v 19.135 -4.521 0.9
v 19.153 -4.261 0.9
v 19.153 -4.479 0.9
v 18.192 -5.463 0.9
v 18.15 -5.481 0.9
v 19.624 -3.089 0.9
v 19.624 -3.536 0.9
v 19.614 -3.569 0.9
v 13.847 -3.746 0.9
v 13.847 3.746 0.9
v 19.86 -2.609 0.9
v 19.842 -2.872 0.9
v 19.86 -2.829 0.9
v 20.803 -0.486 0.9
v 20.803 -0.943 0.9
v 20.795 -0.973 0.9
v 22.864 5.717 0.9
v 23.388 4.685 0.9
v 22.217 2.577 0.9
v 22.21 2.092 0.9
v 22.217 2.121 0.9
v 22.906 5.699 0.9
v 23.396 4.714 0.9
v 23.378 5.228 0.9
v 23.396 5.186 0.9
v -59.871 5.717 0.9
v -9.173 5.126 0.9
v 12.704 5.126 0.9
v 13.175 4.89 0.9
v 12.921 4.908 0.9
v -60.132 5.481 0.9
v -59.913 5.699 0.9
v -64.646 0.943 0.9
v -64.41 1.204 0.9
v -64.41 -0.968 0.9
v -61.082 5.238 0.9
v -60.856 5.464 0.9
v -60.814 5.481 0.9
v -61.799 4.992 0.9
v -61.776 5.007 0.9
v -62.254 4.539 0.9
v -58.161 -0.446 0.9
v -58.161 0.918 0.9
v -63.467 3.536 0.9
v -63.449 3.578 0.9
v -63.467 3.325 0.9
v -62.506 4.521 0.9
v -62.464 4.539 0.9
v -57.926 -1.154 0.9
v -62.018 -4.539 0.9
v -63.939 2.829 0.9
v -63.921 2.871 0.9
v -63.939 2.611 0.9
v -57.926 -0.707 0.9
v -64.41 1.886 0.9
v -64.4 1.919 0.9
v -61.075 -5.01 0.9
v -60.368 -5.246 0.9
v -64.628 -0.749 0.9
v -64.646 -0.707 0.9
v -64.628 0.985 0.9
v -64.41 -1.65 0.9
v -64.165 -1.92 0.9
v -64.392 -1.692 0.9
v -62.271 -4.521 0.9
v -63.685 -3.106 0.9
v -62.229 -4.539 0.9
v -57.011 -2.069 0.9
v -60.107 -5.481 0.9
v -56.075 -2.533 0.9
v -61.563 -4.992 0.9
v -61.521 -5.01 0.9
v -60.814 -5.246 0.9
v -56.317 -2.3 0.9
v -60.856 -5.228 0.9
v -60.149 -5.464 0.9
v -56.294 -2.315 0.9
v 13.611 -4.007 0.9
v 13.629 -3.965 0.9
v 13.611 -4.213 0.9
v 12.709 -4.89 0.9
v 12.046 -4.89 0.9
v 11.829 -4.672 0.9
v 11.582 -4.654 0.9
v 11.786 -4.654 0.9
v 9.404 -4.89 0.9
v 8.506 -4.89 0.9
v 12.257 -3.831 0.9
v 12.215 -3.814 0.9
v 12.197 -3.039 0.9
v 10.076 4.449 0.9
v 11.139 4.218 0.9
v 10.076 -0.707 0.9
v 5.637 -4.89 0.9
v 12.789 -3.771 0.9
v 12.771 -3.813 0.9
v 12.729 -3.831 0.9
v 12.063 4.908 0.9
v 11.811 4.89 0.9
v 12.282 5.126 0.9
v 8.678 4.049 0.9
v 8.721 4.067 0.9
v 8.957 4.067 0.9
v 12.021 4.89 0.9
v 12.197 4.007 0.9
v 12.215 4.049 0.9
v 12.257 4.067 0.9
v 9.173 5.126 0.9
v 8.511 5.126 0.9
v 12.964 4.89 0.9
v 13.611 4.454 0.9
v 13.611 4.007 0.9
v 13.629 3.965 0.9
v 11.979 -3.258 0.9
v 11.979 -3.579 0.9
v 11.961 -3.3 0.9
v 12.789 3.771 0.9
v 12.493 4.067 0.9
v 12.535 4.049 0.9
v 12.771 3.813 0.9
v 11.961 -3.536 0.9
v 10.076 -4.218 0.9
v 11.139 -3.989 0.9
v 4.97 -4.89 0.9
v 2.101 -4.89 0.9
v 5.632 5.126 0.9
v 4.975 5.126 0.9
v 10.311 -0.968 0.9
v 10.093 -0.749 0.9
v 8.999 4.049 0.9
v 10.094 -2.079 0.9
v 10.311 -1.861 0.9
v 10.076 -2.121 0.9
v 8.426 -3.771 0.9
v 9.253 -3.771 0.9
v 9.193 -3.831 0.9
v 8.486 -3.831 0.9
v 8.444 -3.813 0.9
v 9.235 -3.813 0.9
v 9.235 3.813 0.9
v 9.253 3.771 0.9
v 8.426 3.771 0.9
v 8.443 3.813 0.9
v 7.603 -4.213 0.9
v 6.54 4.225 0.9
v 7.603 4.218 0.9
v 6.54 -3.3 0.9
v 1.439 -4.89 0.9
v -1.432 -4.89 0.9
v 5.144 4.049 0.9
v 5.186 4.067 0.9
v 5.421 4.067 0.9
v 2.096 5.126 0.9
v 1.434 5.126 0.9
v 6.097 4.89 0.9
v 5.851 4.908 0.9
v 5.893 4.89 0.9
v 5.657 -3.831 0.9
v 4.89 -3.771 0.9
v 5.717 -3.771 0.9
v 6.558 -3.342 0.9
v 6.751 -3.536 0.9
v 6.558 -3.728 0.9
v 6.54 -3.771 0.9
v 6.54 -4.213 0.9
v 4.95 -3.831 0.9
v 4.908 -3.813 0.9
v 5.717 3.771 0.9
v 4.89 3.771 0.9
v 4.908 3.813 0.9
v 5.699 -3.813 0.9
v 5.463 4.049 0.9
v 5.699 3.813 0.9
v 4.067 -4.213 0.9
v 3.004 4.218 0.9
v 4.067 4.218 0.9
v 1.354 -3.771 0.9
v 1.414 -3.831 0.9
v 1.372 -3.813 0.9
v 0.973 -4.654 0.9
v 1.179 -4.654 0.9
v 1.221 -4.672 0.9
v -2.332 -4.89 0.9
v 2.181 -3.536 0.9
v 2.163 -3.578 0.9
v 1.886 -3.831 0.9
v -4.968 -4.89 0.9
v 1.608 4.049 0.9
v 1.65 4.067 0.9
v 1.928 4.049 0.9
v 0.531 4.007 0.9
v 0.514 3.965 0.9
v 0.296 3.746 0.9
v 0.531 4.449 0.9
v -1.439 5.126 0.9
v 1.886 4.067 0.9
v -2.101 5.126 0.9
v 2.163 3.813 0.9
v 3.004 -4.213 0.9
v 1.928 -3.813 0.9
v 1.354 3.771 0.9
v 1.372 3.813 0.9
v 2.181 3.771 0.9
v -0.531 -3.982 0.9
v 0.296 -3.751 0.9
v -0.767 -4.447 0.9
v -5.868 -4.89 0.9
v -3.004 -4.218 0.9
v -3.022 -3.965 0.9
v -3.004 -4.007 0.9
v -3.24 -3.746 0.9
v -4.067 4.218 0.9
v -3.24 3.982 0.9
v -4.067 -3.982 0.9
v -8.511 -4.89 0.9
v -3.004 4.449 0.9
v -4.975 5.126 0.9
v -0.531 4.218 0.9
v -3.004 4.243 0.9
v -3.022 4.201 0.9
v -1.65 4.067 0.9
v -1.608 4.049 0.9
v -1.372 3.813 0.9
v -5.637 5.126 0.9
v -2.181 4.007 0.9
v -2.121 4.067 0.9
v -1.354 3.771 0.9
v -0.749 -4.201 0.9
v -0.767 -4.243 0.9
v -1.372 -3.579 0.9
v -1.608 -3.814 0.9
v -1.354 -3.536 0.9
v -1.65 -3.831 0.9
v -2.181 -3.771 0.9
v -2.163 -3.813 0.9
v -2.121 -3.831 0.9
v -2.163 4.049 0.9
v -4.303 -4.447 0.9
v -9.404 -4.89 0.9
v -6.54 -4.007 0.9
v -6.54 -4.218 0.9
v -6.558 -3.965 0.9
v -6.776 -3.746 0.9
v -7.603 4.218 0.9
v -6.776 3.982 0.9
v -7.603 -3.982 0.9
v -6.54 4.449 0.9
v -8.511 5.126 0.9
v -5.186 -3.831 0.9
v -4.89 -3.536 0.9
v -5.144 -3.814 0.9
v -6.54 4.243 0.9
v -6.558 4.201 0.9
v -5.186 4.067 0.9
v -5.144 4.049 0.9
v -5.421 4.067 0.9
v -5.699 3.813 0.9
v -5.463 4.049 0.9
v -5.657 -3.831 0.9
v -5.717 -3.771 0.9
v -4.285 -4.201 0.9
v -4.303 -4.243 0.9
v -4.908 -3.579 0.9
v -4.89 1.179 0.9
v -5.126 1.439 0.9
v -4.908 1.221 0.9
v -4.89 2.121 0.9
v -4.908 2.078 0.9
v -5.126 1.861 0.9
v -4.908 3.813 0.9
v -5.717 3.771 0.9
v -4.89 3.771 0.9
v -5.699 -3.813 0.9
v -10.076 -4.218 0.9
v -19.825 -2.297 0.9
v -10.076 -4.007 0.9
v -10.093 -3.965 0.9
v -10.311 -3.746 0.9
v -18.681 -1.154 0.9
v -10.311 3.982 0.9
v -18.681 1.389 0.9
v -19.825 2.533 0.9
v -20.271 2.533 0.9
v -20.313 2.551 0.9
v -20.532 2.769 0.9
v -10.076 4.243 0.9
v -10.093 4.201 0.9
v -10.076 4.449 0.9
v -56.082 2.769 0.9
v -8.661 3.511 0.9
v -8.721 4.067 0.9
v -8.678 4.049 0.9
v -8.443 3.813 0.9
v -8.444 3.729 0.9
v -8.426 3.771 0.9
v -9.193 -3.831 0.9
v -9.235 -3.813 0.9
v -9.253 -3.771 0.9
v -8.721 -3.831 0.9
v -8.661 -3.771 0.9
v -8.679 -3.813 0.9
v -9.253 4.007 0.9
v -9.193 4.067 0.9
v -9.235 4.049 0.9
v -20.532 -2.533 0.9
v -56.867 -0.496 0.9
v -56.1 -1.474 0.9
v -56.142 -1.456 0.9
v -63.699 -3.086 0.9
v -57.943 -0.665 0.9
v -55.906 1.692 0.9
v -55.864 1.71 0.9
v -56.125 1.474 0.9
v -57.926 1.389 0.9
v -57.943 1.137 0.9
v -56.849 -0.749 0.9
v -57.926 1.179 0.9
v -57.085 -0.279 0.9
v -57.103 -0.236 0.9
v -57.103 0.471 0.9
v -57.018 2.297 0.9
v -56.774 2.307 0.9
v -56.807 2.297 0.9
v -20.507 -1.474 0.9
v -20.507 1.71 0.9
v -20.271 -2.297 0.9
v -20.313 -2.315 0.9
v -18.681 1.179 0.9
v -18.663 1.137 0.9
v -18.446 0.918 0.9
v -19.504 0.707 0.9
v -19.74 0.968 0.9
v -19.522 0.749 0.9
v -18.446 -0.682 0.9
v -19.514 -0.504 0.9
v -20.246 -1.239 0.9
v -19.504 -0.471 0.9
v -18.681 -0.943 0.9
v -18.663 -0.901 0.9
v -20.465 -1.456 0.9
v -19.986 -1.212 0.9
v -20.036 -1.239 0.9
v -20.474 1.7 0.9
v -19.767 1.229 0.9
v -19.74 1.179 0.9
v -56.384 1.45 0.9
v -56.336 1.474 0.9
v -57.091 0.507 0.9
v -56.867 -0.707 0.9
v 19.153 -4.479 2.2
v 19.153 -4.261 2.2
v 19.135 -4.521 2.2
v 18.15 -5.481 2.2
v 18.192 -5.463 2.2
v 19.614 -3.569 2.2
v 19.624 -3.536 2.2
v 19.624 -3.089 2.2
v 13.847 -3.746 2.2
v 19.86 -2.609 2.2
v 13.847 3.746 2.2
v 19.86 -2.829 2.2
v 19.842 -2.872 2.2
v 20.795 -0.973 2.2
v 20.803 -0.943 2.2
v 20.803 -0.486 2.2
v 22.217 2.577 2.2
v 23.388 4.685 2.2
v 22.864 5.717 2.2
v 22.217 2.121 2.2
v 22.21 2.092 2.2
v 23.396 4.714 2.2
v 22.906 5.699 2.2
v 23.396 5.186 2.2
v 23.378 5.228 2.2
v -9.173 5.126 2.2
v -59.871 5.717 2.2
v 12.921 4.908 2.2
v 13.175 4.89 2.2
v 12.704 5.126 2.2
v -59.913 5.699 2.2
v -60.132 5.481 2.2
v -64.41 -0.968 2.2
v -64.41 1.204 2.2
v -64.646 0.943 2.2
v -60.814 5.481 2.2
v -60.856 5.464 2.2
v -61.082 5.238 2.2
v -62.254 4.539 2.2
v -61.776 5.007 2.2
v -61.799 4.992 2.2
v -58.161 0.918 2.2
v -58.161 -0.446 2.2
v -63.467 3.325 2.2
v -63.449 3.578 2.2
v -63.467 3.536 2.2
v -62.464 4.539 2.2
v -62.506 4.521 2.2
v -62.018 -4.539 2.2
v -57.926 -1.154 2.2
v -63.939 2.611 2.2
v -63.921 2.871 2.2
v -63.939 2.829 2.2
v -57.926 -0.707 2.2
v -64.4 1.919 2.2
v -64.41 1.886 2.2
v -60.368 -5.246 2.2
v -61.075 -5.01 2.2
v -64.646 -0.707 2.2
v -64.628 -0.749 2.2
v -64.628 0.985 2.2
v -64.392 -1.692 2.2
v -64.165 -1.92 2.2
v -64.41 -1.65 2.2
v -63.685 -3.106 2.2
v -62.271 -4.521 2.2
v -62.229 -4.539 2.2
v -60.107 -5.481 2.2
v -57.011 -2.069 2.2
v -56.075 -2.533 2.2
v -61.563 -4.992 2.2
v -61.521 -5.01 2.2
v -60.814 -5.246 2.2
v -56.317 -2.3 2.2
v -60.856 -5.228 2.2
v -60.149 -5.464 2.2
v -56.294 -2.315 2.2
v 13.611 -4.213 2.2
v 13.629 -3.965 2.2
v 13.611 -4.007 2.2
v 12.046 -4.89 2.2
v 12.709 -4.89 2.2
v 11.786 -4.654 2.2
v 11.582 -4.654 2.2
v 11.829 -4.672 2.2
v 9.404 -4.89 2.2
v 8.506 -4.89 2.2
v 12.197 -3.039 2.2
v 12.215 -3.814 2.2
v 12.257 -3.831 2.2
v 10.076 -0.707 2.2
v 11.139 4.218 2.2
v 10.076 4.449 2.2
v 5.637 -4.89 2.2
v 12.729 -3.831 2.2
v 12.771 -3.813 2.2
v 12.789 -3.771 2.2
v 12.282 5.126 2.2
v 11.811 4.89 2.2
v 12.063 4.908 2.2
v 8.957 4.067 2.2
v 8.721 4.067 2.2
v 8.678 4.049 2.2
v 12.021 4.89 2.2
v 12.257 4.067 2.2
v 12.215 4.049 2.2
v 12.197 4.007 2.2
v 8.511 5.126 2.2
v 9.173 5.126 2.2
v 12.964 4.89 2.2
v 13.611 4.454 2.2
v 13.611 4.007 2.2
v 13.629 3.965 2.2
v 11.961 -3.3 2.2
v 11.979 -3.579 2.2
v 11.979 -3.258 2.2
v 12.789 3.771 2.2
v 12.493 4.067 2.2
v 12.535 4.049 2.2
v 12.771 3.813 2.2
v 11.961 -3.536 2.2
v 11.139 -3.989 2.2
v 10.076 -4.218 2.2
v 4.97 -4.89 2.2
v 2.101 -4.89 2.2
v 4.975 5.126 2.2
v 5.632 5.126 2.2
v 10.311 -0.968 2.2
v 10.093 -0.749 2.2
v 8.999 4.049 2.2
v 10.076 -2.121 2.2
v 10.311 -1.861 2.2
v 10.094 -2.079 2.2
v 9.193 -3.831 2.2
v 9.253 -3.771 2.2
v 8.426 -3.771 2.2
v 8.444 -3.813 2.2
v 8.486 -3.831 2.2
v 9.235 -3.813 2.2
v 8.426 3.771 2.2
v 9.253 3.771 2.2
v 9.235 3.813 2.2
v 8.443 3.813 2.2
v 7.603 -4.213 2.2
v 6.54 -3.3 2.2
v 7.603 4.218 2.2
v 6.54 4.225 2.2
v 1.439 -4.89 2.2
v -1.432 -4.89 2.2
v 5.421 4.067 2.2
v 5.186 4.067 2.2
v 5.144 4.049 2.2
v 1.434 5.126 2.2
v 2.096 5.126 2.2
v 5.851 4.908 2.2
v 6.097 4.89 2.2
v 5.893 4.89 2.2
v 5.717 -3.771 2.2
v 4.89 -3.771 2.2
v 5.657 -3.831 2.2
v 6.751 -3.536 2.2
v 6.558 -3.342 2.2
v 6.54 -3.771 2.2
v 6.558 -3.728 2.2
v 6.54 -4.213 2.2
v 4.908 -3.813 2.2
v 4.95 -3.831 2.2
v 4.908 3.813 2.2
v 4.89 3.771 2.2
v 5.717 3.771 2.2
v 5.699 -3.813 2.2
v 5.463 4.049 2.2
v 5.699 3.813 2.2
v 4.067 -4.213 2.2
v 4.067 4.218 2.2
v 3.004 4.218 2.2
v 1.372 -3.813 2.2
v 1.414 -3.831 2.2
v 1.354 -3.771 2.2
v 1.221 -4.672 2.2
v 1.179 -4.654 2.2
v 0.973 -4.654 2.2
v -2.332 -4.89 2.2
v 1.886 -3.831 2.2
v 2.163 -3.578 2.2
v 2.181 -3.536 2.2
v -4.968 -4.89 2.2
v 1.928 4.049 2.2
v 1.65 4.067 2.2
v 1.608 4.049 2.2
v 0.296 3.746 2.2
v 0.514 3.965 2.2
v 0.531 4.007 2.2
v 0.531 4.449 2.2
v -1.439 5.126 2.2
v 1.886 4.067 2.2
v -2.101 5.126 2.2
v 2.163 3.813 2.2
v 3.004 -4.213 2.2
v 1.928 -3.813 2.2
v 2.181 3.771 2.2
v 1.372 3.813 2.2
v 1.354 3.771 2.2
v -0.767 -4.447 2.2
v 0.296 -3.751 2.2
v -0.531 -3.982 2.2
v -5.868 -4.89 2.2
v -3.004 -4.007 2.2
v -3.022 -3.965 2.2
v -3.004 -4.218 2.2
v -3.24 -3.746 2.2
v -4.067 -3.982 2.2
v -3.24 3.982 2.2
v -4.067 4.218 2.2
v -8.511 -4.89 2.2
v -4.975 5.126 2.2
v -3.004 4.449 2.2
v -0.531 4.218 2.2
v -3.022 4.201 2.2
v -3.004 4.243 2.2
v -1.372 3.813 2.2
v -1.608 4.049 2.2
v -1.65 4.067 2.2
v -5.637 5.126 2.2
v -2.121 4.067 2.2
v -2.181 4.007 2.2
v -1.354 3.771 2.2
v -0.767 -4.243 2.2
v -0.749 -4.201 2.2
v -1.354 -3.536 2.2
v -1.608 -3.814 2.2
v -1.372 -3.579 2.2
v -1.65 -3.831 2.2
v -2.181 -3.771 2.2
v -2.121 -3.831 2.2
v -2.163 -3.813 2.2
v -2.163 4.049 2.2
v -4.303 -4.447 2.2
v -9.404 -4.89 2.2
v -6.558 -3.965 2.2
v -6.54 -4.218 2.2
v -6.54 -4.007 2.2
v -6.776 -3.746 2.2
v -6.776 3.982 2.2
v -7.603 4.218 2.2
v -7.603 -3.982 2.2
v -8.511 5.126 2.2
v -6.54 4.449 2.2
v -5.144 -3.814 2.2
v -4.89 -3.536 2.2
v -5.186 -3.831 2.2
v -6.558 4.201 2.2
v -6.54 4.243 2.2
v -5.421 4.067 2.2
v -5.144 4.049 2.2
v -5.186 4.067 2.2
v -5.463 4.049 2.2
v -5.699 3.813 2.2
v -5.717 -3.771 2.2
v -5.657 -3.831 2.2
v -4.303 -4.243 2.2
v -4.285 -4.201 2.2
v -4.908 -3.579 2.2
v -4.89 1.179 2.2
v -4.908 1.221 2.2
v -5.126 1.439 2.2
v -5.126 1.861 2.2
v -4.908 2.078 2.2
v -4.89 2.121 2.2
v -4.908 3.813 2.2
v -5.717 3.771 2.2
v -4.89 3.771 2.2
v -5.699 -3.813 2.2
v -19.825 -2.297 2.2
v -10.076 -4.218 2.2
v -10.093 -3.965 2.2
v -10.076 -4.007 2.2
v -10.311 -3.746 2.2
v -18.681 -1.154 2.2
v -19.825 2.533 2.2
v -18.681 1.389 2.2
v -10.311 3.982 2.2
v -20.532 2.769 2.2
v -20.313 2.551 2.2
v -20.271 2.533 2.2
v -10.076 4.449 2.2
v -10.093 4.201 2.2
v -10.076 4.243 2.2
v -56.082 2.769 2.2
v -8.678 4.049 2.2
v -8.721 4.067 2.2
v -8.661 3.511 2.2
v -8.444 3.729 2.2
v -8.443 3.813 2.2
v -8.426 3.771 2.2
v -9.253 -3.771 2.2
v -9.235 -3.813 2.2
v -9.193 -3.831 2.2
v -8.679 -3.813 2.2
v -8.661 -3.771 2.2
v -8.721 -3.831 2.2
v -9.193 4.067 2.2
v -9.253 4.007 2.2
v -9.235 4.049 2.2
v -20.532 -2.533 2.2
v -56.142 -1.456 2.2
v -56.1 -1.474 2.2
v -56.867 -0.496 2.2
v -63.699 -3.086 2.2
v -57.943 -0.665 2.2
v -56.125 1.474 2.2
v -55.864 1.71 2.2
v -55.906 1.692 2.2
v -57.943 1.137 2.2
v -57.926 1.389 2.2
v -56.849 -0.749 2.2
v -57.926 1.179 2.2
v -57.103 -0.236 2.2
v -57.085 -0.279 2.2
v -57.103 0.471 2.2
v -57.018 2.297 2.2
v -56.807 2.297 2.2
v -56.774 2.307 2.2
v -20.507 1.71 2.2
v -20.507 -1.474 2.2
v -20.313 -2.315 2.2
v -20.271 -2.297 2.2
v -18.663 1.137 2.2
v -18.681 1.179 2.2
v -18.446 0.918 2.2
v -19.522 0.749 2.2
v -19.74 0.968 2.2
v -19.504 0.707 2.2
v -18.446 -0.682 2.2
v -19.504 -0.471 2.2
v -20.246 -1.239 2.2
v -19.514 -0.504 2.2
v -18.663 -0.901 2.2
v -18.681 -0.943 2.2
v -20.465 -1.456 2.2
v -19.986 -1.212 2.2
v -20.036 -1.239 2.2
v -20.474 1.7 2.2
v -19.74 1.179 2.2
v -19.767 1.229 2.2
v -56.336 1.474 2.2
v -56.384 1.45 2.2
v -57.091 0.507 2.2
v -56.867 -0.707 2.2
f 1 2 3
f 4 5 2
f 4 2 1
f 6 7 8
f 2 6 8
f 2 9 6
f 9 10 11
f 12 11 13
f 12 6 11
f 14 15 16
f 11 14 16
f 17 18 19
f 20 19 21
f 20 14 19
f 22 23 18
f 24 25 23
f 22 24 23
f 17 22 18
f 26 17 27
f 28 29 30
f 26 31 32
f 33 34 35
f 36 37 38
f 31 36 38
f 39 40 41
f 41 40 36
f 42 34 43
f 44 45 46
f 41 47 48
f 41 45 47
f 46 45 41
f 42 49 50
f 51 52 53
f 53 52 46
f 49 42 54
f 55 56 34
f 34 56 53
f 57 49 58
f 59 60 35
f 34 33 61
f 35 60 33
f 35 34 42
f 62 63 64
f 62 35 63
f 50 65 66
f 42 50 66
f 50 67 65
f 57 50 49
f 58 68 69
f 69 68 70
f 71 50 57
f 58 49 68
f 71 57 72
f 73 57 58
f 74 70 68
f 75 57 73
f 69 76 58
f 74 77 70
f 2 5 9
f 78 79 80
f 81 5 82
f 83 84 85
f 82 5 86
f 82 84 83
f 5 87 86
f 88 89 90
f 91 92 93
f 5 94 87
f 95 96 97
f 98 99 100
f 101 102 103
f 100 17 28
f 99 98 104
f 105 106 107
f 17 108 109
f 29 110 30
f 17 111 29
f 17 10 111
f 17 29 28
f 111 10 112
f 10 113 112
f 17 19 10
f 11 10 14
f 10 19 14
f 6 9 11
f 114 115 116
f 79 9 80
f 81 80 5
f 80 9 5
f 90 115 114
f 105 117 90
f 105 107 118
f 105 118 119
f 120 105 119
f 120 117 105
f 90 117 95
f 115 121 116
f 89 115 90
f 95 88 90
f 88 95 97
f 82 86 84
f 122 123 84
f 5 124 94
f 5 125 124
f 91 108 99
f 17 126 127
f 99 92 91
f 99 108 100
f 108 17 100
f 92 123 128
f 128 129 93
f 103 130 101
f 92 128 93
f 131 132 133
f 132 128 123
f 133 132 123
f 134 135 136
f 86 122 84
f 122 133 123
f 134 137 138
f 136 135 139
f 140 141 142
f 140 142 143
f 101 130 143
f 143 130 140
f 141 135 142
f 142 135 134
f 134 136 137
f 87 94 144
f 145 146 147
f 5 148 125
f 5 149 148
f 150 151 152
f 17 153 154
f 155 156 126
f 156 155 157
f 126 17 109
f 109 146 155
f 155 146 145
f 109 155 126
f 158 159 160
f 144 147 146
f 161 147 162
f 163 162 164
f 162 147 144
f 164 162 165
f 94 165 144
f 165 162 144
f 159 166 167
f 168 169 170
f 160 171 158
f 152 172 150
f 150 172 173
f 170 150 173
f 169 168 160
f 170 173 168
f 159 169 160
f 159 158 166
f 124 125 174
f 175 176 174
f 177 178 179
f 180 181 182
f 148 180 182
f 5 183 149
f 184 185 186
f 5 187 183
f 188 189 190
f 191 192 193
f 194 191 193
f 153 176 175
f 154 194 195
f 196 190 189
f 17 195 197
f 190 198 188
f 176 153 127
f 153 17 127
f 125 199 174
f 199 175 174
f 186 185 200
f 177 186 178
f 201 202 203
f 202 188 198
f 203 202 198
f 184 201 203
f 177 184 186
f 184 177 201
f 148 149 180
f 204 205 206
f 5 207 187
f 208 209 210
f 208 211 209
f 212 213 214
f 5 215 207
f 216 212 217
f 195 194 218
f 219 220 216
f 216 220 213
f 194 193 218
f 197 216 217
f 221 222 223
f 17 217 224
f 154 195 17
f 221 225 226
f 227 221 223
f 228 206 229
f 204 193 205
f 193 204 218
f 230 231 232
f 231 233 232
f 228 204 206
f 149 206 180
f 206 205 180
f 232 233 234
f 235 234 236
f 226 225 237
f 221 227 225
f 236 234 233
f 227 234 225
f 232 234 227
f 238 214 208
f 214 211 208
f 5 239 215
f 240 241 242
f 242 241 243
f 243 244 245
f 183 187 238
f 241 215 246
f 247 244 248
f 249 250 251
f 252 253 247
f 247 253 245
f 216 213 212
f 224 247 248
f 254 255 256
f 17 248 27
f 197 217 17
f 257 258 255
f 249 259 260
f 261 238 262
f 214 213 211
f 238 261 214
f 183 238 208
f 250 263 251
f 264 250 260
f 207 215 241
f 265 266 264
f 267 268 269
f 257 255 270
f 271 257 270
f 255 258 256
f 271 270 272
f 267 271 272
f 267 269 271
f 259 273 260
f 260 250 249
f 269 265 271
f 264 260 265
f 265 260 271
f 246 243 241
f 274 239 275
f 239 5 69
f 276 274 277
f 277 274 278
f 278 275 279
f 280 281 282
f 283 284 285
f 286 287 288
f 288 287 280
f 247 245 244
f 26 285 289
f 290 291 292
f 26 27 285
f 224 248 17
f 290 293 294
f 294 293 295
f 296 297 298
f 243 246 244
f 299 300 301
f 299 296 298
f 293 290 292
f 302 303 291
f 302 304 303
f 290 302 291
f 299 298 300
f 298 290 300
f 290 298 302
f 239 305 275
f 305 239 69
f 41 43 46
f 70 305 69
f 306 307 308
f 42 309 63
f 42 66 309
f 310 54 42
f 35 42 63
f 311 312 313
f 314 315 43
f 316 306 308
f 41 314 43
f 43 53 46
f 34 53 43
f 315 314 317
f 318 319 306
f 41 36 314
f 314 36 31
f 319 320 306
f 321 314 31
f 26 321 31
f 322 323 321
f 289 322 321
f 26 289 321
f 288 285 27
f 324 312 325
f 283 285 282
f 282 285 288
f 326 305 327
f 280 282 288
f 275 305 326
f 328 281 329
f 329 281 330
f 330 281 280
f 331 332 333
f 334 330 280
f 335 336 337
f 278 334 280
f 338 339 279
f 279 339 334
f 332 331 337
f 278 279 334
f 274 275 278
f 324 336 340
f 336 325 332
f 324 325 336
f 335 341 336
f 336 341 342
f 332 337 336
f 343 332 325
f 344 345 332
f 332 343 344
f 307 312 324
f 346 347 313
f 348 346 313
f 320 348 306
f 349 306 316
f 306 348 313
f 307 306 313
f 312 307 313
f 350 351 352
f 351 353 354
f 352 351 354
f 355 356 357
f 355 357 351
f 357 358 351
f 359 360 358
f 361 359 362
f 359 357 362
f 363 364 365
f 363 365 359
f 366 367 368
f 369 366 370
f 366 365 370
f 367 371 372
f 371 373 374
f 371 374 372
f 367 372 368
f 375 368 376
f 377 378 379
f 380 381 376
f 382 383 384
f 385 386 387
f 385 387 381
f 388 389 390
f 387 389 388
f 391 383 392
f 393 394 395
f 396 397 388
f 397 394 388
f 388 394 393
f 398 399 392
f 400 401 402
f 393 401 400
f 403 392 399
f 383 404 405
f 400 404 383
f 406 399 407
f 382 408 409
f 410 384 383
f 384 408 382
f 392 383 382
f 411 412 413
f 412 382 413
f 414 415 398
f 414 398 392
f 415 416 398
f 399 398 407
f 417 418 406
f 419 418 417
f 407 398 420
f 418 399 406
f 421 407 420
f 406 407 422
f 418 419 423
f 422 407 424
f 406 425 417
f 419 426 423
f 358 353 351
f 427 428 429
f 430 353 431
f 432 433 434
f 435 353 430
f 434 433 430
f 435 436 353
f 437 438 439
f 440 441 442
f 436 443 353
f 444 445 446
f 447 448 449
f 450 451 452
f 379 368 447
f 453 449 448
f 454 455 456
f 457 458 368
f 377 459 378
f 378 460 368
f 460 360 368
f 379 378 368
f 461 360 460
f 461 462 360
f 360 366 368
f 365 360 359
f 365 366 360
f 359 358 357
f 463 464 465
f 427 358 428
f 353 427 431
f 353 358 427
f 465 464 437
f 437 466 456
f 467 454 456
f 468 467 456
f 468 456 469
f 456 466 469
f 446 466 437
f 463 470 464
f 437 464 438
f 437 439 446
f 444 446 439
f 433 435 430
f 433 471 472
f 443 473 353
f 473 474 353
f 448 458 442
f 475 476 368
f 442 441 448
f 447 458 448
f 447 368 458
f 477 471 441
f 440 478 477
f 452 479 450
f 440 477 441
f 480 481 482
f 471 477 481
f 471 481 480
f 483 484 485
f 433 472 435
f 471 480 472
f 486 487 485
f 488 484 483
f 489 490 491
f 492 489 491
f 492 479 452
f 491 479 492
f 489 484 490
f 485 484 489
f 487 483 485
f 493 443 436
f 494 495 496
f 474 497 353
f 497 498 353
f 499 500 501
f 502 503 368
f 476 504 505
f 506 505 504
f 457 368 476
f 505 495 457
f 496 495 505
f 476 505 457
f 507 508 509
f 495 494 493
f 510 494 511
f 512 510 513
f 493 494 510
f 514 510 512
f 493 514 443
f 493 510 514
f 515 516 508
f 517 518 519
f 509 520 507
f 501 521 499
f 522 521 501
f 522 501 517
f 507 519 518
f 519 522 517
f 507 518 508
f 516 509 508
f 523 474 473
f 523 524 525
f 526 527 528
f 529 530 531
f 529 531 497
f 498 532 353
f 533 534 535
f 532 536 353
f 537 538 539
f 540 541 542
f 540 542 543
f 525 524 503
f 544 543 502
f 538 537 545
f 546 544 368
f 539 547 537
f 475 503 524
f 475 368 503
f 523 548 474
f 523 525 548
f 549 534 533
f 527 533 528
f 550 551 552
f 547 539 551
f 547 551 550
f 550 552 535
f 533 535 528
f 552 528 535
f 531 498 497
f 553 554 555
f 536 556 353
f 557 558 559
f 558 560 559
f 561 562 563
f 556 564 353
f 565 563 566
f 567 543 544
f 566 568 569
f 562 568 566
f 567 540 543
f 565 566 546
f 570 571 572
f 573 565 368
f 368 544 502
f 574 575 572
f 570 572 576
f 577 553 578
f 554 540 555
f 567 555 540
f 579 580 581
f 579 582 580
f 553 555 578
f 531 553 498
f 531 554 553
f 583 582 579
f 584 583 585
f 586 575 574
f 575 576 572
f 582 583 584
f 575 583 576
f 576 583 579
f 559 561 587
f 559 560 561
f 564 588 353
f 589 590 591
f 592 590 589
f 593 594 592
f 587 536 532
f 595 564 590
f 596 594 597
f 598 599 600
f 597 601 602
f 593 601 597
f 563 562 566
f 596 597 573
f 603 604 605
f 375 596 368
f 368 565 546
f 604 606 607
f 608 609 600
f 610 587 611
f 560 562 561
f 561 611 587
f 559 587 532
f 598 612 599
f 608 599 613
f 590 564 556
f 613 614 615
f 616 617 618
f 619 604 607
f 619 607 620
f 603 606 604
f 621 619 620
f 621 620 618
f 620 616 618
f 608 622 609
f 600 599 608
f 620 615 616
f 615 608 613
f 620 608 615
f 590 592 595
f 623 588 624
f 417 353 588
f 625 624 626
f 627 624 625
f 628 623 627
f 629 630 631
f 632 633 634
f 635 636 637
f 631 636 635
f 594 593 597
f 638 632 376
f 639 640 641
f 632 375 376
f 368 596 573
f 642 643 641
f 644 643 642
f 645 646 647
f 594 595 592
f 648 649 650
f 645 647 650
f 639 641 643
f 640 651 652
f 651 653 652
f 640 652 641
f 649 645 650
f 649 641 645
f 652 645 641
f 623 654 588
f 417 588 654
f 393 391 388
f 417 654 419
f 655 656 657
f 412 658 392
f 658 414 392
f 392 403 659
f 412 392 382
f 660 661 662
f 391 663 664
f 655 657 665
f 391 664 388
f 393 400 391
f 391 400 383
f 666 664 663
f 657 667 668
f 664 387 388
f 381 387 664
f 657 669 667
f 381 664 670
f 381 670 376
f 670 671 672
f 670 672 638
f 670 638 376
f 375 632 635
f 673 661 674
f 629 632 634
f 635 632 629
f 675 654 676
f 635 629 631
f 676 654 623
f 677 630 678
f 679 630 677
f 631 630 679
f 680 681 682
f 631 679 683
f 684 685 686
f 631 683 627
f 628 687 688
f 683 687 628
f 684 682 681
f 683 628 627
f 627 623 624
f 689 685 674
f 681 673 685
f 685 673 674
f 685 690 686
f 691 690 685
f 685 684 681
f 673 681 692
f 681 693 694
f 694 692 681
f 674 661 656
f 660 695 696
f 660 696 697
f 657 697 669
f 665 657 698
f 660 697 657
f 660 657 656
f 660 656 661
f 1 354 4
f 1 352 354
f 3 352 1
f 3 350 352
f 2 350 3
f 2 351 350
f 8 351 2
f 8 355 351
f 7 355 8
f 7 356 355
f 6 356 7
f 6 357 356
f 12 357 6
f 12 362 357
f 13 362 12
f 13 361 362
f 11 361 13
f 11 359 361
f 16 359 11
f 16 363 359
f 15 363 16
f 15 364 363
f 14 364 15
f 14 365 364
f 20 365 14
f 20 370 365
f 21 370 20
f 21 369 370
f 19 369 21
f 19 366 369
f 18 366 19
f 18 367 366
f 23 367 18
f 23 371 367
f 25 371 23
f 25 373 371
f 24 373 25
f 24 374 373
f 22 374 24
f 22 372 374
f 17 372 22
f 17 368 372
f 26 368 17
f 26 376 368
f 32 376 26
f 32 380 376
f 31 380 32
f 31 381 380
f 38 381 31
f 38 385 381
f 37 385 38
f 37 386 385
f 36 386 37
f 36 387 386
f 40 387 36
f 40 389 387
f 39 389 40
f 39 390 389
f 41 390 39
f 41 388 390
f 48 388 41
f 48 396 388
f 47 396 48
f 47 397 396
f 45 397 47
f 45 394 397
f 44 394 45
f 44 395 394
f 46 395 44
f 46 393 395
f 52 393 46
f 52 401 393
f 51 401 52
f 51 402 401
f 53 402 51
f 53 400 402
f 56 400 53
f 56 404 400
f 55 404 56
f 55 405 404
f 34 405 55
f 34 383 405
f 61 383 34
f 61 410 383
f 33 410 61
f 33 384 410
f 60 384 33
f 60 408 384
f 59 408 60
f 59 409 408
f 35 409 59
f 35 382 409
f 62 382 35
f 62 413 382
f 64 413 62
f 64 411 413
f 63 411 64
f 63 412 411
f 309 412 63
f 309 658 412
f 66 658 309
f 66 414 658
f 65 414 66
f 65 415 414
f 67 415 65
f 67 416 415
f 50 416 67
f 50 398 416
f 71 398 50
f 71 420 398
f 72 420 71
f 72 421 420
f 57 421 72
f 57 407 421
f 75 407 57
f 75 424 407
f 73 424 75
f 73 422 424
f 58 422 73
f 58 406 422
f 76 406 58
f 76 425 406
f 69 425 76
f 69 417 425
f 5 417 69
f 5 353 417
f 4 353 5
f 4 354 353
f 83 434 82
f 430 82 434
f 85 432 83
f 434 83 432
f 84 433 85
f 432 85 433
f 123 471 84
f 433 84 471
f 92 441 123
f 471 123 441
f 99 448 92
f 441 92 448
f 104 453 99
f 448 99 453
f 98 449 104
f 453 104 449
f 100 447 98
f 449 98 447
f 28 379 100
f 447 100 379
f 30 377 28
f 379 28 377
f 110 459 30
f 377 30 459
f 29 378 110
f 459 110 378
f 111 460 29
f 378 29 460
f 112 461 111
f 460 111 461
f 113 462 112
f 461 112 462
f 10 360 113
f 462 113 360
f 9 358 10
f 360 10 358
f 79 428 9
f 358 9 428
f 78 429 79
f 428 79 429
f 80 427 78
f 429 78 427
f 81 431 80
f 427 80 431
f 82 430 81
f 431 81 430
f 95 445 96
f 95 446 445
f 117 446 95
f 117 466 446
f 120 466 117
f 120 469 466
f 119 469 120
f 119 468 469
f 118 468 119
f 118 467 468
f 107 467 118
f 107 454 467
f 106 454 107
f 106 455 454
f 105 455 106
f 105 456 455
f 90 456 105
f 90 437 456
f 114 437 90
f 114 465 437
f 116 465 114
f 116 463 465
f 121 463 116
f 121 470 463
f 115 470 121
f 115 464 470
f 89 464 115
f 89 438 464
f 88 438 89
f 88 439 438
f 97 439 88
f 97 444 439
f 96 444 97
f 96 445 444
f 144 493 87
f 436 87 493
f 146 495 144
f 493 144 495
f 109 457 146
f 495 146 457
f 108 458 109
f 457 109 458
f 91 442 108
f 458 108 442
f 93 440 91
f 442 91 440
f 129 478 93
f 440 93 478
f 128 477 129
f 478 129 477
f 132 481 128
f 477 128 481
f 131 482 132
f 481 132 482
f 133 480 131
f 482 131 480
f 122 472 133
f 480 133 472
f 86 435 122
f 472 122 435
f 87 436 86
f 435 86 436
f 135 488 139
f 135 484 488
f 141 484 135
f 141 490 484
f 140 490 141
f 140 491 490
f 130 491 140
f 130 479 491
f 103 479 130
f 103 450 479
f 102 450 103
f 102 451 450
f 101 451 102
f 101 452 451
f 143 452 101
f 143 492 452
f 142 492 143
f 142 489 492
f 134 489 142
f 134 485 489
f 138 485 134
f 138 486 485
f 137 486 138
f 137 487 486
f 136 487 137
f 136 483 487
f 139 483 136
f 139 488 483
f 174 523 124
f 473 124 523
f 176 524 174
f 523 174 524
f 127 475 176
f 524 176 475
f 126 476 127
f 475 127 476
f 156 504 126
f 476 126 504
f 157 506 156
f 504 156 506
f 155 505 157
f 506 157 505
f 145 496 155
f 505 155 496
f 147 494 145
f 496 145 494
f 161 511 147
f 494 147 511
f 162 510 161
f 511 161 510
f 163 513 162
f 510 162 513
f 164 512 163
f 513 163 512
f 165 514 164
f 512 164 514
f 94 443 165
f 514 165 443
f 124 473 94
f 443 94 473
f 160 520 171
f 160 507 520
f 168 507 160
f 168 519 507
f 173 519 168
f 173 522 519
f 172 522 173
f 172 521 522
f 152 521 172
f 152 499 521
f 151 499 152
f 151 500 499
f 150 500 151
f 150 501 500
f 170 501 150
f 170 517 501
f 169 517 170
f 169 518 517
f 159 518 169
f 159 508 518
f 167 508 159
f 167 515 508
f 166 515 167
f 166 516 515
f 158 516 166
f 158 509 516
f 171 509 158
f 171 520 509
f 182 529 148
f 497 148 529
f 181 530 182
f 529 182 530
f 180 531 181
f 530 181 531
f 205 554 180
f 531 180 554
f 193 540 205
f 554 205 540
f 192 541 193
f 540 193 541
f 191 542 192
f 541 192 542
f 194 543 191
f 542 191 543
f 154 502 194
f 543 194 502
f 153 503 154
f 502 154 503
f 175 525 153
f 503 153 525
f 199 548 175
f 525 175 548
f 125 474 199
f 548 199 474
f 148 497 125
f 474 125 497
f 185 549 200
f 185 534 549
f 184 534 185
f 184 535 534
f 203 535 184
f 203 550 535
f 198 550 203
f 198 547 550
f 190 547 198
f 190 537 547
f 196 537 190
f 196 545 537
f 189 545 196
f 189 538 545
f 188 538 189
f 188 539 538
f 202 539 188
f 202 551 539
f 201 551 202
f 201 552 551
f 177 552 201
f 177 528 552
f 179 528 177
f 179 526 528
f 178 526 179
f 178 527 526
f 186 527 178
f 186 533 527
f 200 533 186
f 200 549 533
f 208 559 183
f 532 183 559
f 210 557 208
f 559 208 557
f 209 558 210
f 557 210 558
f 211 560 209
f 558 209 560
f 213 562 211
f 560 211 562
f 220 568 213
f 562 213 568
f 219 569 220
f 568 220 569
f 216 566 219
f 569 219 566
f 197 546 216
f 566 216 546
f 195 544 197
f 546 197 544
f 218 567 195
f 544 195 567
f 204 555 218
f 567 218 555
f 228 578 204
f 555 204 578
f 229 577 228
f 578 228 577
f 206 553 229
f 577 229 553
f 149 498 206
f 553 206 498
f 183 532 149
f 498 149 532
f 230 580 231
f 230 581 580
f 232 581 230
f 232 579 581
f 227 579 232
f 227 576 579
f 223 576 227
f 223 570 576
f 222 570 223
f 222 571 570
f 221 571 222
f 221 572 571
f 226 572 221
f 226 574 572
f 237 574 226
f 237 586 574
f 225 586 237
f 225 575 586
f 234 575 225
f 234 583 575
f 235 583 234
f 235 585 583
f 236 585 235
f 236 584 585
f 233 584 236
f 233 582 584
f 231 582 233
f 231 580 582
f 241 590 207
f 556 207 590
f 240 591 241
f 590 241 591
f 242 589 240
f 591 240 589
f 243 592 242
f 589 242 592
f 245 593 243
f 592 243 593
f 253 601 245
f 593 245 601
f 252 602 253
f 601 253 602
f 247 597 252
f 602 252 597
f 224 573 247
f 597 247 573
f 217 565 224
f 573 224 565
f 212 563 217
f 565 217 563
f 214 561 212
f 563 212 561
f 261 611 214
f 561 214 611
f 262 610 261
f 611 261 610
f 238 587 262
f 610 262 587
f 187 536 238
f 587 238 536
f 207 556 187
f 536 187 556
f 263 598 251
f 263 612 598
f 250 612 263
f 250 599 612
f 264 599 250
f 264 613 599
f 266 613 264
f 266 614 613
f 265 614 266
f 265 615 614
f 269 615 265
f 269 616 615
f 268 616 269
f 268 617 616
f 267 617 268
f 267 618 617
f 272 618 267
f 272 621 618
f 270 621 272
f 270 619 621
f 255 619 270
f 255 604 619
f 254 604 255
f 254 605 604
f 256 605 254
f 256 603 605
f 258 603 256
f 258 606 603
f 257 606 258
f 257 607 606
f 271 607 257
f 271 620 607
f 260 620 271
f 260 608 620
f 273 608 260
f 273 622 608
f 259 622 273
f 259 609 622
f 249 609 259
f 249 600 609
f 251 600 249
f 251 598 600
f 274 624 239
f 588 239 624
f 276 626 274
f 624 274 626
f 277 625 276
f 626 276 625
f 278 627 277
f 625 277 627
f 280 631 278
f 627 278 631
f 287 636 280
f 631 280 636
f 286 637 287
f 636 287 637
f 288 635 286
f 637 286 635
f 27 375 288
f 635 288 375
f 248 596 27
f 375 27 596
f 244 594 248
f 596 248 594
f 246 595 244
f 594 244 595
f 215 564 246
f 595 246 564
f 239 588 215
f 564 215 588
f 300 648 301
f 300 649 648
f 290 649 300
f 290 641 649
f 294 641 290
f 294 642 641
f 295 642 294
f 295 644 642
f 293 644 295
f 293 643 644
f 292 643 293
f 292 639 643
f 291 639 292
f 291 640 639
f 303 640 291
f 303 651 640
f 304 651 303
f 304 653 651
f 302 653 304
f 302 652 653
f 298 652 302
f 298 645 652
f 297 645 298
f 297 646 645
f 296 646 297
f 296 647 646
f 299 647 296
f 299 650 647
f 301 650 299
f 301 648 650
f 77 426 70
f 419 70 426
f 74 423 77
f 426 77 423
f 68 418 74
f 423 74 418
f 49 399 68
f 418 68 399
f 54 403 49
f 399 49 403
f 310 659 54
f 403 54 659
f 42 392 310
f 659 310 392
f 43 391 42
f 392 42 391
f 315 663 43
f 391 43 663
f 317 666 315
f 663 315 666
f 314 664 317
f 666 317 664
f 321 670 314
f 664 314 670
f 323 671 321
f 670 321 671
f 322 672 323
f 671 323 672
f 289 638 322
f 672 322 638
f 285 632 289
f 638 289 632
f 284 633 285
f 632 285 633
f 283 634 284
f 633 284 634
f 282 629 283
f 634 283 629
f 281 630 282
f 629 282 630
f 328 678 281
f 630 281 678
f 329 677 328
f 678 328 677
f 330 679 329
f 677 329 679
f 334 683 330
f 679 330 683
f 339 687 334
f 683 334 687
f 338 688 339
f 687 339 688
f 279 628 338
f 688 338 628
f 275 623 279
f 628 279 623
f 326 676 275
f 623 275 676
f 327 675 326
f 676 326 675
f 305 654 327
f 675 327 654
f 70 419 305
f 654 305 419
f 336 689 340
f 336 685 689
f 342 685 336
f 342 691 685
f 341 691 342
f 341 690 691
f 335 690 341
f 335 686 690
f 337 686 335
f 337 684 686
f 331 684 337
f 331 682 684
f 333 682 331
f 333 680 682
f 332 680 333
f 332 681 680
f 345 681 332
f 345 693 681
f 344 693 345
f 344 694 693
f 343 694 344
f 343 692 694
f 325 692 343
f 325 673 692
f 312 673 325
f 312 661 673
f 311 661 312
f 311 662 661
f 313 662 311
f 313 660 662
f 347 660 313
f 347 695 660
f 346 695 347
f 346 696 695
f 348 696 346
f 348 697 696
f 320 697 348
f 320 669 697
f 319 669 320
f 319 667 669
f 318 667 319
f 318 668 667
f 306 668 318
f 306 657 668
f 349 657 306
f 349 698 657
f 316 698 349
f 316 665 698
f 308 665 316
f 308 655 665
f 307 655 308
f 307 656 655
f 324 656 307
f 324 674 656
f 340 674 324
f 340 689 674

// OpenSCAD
$fn = 24;
translate([0, 0.000, 0.900])
  linear_extrude(height=1.300) {
offset(r=0.06, $fn=8) {
    polygon(points=[[-57.043,0.471],[-57.043,-0.236],[-56.807,-0.471],[-56.807,-0.707],[-56.100,-1.414],[-20.507,-1.414],[-20.271,-1.179],[-20.036,-1.179],[-19.564,-0.471],[-19.564,0.707],[-19.800,0.943],[-19.800,1.179],[-20.507,1.650],[-55.864,1.650],[-56.100,1.414],[-56.336,1.414]], paths=[[0,1,2,3,4,5,6,7,8,9,10,11,12,13,14,15]]);
    polygon(points=[[12.257,4.007],[12.257,-3.064],[12.021,-3.300],[12.021,-3.536],[12.257,-3.771],[12.729,-3.771],[12.729,3.771],[12.493,4.007]], paths=[[0,1,2,3,4,5,6,7]]);
    polygon(points=[[8.721,4.007],[8.486,3.771],[8.486,-3.771],[9.193,-3.771],[9.193,3.771],[8.957,4.007]], paths=[[0,1,2,3,4,5]]);
    polygon(points=[[5.186,4.007],[4.950,3.771],[4.950,-3.771],[5.657,-3.771],[5.657,3.771],[5.421,4.007]], paths=[[0,1,2,3,4,5]]);
    polygon(points=[[1.886,4.007],[1.650,4.007],[1.414,3.771],[1.414,-3.771],[1.886,-3.771],[2.121,-3.536],[2.121,3.771]], paths=[[0,1,2,3,4,5,6]]);
    polygon(points=[[-2.121,4.007],[-2.121,-3.771],[-1.650,-3.771],[-1.414,-3.536],[-1.414,3.771],[-1.650,4.007]], paths=[[0,1,2,3,4,5]]);
    polygon(points=[[-5.186,4.007],[-5.421,4.007],[-5.657,3.771],[-5.657,-3.771],[-5.186,-3.771],[-4.950,-3.536],[-4.950,1.179],[-5.186,1.414],[-5.186,1.886],[-4.950,2.121],[-4.950,3.771]], paths=[[0,1,2,3,4,5,6,7,8,9,10]]);
    polygon(points=[[-9.193,4.007],[-9.193,-3.771],[-8.721,-3.771],[-8.721,3.536],[-8.486,3.771],[-8.721,4.007]], paths=[[0,1,2,3,4,5]]);
    polygon(points=[[-64.586,-0.707],[-64.350,-0.943],[-64.350,-1.650],[-64.114,-1.886],[-63.643,-3.064],[-62.229,-4.479],[-61.993,-4.479],[-61.521,-4.950],[-61.050,-4.950],[-60.814,-5.186],[-60.343,-5.186],[-60.107,-5.421],[18.150,-5.421],[19.093,-4.479],[19.093,-4.243],[19.564,-3.536],[19.564,-3.064],[19.800,-2.829],[19.800,-2.593],[20.743,-0.943],[20.743,-0.471],[22.157,2.121],[22.157,2.593],[23.336,4.714],[23.336,5.186],[22.864,5.657],[-59.871,5.657],[-60.107,5.421],[-60.814,5.421],[-61.050,5.186],[-61.757,4.950],[-62.229,4.479],[-62.464,4.479],[-63.407,3.536],[-63.407,3.300],[-63.879,2.829],[-63.879,2.593],[-64.350,1.886],[-64.350,1.179],[-64.586,0.943],[-58.221,0.943],[-57.986,1.179],[-57.986,1.414],[-57.043,2.357],[-56.807,2.357],[-56.100,2.829],[-20.507,2.829],[-20.271,2.593],[-19.800,2.593],[-18.621,1.414],[-18.621,1.179],[-18.386,0.943],[-18.386,-0.707],[-18.621,-0.943],[-18.621,-1.179],[-19.800,-2.357],[-20.271,-2.357],[-20.507,-2.593],[-56.100,-2.593],[-56.336,-2.357],[-57.043,-2.121],[-57.986,-1.179],[-57.986,-0.707],[-58.221,-0.471],[12.257,5.186],[12.729,5.186],[12.964,4.950],[13.200,4.950],[13.671,4.479],[13.671,4.007],[13.907,3.771],[13.907,-3.771],[13.671,-4.007],[13.671,-4.243],[12.729,-4.950],[12.021,-4.950],[11.786,-4.714],[11.550,-4.714],[11.079,-4.007],[11.079,4.243],[11.786,4.950],[12.021,4.950],[8.486,5.186],[9.193,5.186],[10.136,4.479],[10.136,-0.707],[10.371,-0.943],[10.371,-1.886],[10.136,-2.121],[10.136,-4.243],[9.429,-4.950],[8.486,-4.950],[7.543,-4.243],[7.543,4.243],[4.950,5.186],[5.657,5.186],[5.893,4.950],[6.129,4.950],[6.600,4.243],[6.600,-3.300],[6.836,-3.536],[6.600,-3.771],[6.600,-4.243],[5.657,-4.950],[4.950,-4.950],[4.007,-4.243],[4.007,4.243],[1.414,5.186],[2.121,5.186],[3.064,4.243],[3.064,-4.243],[2.121,-4.950],[1.414,-4.950],[1.179,-4.714],[0.943,-4.714],[0.236,-3.771],[0.236,3.771],[0.471,4.007],[0.471,4.479],[-2.121,5.186],[-1.414,5.186],[-0.471,4.243],[-0.471,-4.007],[-0.707,-4.243],[-0.707,-4.479],[-1.414,-4.950],[-2.357,-4.950],[-3.064,-4.243],[-3.064,-4.007],[-3.300,-3.771],[-3.300,4.007],[-3.064,4.243],[-3.064,4.479],[-5.657,5.186],[-4.950,5.186],[-4.007,4.243],[-4.007,-4.007],[-4.243,-4.243],[-4.243,-4.479],[-4.950,-4.950],[-5.893,-4.950],[-6.600,-4.243],[-6.600,-4.007],[-6.836,-3.771],[-6.836,4.007],[-6.600,4.243],[-6.600,4.479],[-9.193,5.186],[-8.486,5.186],[-7.543,4.243],[-7.543,-4.007],[-8.486,-4.950],[-9.429,-4.950],[-10.136,-4.243],[-10.136,-4.007],[-10.371,-3.771],[-10.371,4.007],[-10.136,4.243],[-10.136,4.479]], paths=[[0,1,2,3,4,5,6,7,8,9,10,11,12,13,14,15,16,17,18,19,20,21,22,23,24,25,26,27,28,29,30,31,32,33,34,35,36,37,38,39],[40,41,42,43,44,45,46,47,48,49,50,51,52,53,54,55,56,57,58,59,60,61,62,63],[64,65,66,67,68,69,70,71,72,73,74,75,76,77,78,79,80,81],[82,83,84,85,86,87,88,89,90,91,92,93],[94,95,96,97,98,99,100,101,102,103,104,105,106],[107,108,109,110,111,112,113,114,115,116,117,118],[119,120,121,122,123,124,125,126,127,128,129,130,131,132],[133,134,135,136,137,138,139,140,141,142,143,144,145,146],[147,148,149,150,151,152,153,154,155,156,157,158]]);
}
}
